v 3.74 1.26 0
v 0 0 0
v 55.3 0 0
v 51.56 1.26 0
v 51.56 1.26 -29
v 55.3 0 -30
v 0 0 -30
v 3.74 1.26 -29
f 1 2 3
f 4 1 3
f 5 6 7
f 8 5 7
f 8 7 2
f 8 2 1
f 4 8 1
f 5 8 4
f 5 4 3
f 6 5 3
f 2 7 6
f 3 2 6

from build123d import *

# Parameters (mm, degrees)
ESBO_O1_W                = 55.3
ESBO_O1_H                = 30
RESSALTO_EXTRUS_O1_DEPTH = 1.26
CORTE_EXTRUS_O1_DEPTH    = 63.925969202
CORTE_EXTRUS_O2_DEPTH    = 63.925969202


with BuildPart() as part:
    # Esboço1 → Ressalto-extrusão1 (new body)
    with BuildSketch(Plane(origin=(0, 0, 0), x_dir=(1, 0, 0), z_dir=(0, 1, 0))):
        with Locations((27.65, 15)):
            Rectangle(ESBO_O1_W, ESBO_O1_H)
    extrude(amount=RESSALTO_EXTRUS_O1_DEPTH)

    # Esboço2 → Corte-extrusão1 (cut, through all)
    with BuildSketch(Plane.ZY):
        Polygon((-30, 0), (-29, 1.26), (-30, 1.26), align=None)
    extrude(amount=-CORTE_EXTRUS_O1_DEPTH, mode=Mode.SUBTRACT)

    # Esboço3 → Corte-extrusão2 (cut, through all)
    with BuildSketch(Plane.XY):
        Polygon((0, 1.26), (0, 0), (3.74, 1.26), align=None)
        Polygon((55.3, 1.26), (51.56, 1.26), (55.3, 0), align=None)
    extrude(amount=-CORTE_EXTRUS_O2_DEPTH, mode=Mode.SUBTRACT)


solid = part.part
